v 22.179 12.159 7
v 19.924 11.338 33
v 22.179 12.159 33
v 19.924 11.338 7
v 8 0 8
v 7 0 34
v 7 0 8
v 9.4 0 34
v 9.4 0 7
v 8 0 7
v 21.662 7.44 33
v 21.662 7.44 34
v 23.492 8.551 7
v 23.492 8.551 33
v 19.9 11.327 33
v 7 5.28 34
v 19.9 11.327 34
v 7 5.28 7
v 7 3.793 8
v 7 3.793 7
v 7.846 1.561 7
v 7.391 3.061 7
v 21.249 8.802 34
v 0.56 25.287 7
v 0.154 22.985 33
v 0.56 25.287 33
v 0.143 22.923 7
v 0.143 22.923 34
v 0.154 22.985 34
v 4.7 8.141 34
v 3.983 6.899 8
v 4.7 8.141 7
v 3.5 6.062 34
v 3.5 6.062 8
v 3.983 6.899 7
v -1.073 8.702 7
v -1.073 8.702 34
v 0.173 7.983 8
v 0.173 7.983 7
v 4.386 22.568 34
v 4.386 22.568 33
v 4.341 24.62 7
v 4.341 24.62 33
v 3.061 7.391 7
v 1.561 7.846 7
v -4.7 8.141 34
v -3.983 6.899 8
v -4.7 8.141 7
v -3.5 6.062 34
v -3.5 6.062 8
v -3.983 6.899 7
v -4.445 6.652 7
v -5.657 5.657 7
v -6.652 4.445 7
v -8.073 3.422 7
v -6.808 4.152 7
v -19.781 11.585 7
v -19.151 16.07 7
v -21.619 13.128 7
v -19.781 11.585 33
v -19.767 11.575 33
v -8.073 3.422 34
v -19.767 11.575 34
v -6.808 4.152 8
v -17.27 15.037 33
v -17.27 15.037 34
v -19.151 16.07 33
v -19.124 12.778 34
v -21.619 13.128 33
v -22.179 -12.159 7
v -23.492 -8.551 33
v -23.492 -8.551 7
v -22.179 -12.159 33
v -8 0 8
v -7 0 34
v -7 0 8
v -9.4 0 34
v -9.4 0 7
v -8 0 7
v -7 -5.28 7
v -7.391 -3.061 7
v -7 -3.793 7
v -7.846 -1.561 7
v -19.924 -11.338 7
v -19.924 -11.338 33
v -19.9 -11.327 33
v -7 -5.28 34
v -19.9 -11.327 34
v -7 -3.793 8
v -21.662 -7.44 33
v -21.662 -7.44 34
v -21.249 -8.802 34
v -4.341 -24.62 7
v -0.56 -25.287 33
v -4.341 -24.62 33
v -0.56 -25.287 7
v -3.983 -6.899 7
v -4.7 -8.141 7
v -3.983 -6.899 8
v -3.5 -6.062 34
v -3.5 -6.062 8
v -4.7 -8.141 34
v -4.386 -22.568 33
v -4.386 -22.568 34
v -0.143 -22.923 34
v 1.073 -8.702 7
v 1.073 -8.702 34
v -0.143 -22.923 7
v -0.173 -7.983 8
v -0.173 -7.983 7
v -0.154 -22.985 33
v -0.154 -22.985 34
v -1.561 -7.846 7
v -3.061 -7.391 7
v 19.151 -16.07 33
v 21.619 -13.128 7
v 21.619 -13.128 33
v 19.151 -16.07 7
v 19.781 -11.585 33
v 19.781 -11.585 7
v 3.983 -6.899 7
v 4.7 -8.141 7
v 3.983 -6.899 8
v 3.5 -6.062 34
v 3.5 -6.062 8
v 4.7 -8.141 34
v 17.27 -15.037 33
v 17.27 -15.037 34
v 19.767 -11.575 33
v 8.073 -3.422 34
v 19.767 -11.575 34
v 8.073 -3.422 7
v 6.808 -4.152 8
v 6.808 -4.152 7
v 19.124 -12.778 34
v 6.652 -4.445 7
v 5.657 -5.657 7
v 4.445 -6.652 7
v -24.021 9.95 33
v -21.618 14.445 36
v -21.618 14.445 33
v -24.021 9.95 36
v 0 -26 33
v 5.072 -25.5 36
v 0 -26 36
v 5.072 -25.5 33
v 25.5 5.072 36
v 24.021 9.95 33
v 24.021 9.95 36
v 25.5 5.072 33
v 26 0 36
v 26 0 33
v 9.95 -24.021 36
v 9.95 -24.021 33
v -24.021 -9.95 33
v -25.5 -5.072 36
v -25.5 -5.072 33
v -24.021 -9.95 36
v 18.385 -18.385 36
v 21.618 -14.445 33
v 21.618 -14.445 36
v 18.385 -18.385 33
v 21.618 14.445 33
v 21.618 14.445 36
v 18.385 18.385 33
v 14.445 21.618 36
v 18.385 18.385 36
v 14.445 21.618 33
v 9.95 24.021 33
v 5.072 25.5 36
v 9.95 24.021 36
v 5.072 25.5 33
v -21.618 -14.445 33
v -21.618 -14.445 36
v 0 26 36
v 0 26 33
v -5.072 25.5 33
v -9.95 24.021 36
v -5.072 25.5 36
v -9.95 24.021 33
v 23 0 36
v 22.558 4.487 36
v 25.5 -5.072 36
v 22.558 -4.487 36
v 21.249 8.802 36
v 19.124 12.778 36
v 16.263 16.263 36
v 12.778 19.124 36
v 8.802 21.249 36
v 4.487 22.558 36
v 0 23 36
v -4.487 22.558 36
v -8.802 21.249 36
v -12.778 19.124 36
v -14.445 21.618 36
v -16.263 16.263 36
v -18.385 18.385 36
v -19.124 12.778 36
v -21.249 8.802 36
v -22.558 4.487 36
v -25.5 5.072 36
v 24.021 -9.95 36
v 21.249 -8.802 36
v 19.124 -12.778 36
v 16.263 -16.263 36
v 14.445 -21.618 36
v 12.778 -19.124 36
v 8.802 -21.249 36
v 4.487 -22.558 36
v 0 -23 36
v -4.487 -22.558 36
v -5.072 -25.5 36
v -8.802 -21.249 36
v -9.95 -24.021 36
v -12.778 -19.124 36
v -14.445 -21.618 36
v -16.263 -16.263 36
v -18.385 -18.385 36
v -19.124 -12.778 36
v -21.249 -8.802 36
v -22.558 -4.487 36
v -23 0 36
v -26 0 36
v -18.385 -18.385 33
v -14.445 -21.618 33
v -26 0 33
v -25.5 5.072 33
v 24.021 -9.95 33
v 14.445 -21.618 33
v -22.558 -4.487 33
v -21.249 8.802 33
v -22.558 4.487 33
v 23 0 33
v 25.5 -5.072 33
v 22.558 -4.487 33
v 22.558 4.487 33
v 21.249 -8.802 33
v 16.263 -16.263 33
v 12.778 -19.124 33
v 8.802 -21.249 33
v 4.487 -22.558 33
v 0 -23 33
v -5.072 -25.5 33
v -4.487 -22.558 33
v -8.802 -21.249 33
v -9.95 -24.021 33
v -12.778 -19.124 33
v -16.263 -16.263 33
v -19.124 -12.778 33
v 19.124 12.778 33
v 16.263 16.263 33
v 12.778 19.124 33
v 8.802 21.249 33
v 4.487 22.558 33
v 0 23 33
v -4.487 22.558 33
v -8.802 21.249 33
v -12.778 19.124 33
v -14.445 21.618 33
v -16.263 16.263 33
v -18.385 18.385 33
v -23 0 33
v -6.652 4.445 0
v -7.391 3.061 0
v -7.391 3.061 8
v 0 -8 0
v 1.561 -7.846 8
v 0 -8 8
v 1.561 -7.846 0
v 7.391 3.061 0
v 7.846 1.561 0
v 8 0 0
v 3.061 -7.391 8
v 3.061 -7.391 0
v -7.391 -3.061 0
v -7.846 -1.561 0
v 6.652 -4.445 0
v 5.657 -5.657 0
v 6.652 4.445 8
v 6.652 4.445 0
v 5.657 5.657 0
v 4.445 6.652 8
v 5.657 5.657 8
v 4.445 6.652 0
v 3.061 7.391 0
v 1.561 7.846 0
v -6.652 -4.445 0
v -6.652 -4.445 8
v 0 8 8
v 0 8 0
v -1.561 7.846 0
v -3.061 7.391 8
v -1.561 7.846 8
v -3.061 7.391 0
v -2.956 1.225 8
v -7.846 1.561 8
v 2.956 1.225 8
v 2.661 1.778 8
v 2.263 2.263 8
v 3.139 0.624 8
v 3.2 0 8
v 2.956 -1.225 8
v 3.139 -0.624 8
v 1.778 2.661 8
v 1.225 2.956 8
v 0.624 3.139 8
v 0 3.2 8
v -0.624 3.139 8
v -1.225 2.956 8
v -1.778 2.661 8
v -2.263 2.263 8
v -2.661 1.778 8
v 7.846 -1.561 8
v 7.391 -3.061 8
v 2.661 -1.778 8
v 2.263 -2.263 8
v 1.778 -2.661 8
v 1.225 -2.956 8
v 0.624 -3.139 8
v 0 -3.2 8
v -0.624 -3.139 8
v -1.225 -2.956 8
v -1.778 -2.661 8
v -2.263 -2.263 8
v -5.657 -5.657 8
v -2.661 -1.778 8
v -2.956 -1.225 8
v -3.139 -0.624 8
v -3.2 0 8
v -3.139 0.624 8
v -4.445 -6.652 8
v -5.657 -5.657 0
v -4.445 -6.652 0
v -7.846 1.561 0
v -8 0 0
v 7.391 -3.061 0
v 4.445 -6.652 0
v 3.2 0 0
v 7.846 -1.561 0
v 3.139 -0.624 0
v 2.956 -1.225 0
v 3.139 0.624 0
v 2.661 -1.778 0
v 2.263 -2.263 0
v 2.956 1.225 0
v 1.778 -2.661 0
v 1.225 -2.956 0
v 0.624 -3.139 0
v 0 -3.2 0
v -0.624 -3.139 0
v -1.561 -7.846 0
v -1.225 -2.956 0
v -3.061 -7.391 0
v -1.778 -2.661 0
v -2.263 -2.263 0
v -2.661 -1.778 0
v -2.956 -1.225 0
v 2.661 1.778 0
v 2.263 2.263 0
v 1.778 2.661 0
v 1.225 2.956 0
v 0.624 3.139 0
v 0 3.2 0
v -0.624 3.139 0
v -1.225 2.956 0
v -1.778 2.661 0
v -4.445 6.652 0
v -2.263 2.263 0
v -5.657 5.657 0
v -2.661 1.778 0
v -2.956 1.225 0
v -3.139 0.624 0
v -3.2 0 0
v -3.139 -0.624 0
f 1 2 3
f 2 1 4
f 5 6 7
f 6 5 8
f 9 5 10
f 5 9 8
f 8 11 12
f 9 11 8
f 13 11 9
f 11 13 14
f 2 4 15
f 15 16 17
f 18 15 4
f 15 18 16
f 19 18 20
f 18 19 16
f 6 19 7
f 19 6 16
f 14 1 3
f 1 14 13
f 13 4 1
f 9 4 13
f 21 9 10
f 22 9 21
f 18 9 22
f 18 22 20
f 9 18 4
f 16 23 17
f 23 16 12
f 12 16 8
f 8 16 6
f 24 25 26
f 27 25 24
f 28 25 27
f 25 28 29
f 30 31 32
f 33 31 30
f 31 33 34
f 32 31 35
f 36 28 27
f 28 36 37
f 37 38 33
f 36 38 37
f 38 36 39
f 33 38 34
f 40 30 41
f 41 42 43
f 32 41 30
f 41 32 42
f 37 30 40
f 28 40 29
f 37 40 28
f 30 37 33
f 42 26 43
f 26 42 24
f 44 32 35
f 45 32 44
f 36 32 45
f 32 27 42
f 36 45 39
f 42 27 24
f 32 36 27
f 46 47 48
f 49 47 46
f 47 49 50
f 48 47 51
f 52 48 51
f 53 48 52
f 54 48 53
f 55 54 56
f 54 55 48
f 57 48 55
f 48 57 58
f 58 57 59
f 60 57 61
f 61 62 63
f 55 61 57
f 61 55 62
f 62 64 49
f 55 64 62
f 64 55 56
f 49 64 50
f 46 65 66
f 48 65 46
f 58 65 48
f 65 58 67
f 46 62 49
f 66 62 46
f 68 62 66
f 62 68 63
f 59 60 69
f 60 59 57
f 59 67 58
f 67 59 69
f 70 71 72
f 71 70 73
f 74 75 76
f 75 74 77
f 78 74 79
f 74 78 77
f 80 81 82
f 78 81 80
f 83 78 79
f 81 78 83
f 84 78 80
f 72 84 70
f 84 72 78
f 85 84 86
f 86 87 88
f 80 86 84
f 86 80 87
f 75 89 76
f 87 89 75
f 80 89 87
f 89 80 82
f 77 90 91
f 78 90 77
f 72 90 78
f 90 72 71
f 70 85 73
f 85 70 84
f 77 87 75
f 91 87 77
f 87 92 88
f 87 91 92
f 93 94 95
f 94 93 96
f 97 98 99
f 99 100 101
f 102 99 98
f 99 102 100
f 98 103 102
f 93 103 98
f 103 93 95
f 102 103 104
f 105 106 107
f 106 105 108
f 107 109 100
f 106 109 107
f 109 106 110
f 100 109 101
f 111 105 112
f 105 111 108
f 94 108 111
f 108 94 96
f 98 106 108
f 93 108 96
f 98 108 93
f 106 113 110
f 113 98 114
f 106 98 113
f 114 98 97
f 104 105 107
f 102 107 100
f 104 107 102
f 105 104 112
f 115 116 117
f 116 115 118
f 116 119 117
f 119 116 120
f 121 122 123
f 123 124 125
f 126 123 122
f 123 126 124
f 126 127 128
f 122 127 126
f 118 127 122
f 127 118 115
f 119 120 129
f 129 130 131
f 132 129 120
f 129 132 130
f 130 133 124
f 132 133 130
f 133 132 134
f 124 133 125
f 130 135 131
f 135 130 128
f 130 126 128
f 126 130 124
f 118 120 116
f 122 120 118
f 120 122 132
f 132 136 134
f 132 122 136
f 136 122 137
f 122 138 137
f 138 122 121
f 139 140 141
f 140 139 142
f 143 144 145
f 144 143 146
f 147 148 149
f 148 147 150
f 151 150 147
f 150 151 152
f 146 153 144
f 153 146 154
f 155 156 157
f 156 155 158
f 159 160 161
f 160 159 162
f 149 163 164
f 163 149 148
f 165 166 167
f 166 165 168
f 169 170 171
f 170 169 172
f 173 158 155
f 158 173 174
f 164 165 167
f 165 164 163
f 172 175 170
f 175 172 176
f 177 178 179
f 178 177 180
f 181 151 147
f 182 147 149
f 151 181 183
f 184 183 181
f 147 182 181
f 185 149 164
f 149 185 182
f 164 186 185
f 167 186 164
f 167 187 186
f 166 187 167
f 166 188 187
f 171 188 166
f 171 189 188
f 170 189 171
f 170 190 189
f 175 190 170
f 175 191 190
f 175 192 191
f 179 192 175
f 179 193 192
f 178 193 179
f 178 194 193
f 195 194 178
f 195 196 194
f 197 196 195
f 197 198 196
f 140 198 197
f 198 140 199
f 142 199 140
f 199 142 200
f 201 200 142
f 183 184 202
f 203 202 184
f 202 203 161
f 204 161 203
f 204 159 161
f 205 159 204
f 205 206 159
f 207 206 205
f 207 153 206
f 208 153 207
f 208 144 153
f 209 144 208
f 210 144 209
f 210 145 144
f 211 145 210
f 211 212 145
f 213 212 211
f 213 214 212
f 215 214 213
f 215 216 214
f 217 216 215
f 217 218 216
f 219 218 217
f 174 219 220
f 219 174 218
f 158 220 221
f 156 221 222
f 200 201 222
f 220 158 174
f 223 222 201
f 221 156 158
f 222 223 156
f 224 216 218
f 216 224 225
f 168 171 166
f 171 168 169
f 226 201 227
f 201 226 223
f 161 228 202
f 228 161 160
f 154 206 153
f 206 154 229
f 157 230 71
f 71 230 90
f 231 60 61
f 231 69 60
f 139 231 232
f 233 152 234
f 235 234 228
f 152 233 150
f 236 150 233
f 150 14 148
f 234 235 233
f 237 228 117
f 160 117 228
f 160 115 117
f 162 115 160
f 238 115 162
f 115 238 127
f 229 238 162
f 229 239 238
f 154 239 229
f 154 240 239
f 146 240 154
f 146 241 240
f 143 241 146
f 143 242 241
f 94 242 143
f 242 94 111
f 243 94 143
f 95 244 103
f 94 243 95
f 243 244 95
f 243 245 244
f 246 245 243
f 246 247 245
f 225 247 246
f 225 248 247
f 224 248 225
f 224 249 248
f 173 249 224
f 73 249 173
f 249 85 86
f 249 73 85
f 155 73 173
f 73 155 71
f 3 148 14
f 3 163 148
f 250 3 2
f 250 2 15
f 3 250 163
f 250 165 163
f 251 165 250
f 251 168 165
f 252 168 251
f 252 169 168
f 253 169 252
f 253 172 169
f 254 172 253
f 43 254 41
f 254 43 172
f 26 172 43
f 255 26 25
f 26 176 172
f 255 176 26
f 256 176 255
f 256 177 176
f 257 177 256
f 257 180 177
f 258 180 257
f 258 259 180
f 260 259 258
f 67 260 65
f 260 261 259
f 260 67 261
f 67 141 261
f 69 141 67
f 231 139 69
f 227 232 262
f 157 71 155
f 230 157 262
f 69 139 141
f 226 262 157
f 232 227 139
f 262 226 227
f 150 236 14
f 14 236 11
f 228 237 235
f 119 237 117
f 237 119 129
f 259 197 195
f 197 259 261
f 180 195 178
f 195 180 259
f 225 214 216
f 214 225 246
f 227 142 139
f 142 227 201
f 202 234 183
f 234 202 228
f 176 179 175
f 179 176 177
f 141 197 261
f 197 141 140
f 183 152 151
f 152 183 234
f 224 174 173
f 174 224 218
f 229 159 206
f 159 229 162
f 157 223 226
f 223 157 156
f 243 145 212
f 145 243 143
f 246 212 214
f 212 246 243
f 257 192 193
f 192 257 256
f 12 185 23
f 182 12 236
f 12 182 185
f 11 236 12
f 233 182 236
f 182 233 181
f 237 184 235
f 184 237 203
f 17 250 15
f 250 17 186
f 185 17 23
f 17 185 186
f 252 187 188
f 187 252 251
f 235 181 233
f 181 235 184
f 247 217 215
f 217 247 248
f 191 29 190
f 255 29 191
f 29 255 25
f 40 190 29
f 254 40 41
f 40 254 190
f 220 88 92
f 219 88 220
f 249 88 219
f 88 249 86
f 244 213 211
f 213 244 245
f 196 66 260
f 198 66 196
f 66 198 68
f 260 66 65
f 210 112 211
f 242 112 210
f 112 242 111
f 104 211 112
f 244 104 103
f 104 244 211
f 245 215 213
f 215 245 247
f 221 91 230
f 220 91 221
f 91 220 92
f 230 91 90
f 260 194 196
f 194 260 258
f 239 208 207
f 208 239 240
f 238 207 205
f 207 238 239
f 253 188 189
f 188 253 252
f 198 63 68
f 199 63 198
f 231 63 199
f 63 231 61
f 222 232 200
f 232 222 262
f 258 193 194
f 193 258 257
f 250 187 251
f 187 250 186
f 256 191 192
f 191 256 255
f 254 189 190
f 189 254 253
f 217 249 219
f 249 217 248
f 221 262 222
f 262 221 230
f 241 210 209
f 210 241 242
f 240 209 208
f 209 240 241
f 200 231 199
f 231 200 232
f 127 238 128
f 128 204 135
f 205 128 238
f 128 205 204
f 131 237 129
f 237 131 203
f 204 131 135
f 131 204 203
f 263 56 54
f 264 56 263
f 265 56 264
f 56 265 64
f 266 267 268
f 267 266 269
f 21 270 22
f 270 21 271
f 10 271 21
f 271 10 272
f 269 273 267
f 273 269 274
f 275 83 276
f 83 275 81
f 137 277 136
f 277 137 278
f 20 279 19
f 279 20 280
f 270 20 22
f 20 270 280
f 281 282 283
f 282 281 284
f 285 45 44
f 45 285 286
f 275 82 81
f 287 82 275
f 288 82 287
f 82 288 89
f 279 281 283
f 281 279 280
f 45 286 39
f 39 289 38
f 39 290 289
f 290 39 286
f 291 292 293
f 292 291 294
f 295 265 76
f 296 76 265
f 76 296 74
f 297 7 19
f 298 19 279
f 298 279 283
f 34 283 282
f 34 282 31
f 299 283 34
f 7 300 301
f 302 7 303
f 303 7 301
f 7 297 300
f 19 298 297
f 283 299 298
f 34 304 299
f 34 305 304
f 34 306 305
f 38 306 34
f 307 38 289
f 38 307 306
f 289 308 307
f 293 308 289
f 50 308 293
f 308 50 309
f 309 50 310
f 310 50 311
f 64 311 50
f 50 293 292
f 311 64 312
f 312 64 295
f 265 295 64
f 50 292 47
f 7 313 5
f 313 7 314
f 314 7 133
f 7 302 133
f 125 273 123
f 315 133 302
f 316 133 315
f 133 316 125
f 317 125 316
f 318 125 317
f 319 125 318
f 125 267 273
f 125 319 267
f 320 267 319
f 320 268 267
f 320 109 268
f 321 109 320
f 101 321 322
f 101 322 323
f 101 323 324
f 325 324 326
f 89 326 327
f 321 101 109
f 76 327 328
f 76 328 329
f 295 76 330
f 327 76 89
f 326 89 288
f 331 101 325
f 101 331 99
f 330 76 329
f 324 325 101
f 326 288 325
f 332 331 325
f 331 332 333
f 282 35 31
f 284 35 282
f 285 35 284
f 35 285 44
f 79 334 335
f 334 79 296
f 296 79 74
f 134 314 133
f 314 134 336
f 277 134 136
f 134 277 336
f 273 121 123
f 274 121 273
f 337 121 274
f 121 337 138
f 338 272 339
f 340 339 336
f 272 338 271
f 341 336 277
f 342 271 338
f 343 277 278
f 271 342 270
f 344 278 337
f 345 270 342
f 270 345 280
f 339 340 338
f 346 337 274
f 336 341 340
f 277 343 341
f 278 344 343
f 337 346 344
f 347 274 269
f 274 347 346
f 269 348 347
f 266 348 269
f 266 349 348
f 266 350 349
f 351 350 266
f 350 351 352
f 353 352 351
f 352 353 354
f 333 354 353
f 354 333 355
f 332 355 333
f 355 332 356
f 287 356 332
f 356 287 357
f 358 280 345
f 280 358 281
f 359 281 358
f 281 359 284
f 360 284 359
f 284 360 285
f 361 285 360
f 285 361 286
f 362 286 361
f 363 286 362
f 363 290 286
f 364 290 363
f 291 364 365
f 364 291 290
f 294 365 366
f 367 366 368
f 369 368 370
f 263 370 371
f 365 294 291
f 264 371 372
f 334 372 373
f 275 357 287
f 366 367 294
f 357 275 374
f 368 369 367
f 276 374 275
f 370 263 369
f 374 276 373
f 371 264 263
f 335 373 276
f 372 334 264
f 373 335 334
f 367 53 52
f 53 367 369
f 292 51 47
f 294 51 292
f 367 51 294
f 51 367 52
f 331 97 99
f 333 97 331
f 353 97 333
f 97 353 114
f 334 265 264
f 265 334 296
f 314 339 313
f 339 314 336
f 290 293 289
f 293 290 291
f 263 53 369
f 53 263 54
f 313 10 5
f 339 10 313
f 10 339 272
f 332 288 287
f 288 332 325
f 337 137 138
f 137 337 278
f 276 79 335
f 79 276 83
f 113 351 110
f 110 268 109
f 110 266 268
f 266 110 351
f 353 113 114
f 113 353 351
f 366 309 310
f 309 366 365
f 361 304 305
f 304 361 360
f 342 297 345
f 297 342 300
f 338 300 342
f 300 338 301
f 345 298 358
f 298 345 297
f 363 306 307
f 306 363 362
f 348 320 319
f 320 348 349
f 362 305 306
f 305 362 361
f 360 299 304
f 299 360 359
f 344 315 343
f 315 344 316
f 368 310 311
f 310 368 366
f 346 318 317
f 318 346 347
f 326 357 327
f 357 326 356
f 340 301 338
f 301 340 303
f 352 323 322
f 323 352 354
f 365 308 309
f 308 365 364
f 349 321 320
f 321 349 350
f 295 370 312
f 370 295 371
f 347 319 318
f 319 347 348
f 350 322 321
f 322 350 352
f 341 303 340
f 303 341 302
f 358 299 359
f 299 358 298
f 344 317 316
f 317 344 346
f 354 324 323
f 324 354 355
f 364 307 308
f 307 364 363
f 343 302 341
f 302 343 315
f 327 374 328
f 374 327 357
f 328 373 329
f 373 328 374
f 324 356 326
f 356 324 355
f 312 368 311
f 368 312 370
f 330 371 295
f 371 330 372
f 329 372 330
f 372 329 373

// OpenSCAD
$fn = 32;

// ----------------------------------------------------------------------
// Impeller: 50 mm, 6 blades, 36 mm tall
// ----------------------------------------------------------------------

// --- parameters (mm) ---
hub_d = 16;               // hub diameter
hub_h = 8;                // hub height
imp_d = 50;               // outer diameter over the blades
blades = 6;               // number of blades
blade_t = 2.4;            // blade thickness
blade_h = 26;             // blade height
blade_in_r = 7;           // blade root radius
blade_out_r = 22.6;       // blade tip radius
sweep = 20;               // blade sweep, degrees
bore_d = 6.4;             // shaft bore
shroud_h = 2;             // shroud ring thickness
shroud_d = 52;            // shroud outside diameter

module hub() {
  cylinder(h = hub_h, d = hub_d);
}

module blade() {
  /* blade swept between two boxes: hull of the root and the tip section */
  hull() {
    translate([blade_in_r, 0, hub_h - 1])
      cube([blade_t, blade_t * 2.2, blade_h + 1], center = false);
    rotate([0, 0, sweep])
      translate([blade_out_r, 0, hub_h - 1])
        cube([blade_t, blade_t * 1.6, blade_h + 1], center = false);
  }
}

module blades() {
  for (i = [0 : blades - 1])
    rotate([0, 0, i * 360 / blades]) blade();
}

module shroud() {
  translate([0, 0, hub_h + blade_h - 1])
    difference() {
      cylinder(h = shroud_h + 1, d = shroud_d);
      translate([0, 0, -1]) cylinder(h = shroud_h + 3, d = shroud_d - 2 * 3);
    }
}

difference() {
  union() {
    hub();
    blades();
    shroud();
  }
  translate([0, 0, -1]) cylinder(h = hub_h + blade_h + shroud_h + 3, d = bore_d);
}
